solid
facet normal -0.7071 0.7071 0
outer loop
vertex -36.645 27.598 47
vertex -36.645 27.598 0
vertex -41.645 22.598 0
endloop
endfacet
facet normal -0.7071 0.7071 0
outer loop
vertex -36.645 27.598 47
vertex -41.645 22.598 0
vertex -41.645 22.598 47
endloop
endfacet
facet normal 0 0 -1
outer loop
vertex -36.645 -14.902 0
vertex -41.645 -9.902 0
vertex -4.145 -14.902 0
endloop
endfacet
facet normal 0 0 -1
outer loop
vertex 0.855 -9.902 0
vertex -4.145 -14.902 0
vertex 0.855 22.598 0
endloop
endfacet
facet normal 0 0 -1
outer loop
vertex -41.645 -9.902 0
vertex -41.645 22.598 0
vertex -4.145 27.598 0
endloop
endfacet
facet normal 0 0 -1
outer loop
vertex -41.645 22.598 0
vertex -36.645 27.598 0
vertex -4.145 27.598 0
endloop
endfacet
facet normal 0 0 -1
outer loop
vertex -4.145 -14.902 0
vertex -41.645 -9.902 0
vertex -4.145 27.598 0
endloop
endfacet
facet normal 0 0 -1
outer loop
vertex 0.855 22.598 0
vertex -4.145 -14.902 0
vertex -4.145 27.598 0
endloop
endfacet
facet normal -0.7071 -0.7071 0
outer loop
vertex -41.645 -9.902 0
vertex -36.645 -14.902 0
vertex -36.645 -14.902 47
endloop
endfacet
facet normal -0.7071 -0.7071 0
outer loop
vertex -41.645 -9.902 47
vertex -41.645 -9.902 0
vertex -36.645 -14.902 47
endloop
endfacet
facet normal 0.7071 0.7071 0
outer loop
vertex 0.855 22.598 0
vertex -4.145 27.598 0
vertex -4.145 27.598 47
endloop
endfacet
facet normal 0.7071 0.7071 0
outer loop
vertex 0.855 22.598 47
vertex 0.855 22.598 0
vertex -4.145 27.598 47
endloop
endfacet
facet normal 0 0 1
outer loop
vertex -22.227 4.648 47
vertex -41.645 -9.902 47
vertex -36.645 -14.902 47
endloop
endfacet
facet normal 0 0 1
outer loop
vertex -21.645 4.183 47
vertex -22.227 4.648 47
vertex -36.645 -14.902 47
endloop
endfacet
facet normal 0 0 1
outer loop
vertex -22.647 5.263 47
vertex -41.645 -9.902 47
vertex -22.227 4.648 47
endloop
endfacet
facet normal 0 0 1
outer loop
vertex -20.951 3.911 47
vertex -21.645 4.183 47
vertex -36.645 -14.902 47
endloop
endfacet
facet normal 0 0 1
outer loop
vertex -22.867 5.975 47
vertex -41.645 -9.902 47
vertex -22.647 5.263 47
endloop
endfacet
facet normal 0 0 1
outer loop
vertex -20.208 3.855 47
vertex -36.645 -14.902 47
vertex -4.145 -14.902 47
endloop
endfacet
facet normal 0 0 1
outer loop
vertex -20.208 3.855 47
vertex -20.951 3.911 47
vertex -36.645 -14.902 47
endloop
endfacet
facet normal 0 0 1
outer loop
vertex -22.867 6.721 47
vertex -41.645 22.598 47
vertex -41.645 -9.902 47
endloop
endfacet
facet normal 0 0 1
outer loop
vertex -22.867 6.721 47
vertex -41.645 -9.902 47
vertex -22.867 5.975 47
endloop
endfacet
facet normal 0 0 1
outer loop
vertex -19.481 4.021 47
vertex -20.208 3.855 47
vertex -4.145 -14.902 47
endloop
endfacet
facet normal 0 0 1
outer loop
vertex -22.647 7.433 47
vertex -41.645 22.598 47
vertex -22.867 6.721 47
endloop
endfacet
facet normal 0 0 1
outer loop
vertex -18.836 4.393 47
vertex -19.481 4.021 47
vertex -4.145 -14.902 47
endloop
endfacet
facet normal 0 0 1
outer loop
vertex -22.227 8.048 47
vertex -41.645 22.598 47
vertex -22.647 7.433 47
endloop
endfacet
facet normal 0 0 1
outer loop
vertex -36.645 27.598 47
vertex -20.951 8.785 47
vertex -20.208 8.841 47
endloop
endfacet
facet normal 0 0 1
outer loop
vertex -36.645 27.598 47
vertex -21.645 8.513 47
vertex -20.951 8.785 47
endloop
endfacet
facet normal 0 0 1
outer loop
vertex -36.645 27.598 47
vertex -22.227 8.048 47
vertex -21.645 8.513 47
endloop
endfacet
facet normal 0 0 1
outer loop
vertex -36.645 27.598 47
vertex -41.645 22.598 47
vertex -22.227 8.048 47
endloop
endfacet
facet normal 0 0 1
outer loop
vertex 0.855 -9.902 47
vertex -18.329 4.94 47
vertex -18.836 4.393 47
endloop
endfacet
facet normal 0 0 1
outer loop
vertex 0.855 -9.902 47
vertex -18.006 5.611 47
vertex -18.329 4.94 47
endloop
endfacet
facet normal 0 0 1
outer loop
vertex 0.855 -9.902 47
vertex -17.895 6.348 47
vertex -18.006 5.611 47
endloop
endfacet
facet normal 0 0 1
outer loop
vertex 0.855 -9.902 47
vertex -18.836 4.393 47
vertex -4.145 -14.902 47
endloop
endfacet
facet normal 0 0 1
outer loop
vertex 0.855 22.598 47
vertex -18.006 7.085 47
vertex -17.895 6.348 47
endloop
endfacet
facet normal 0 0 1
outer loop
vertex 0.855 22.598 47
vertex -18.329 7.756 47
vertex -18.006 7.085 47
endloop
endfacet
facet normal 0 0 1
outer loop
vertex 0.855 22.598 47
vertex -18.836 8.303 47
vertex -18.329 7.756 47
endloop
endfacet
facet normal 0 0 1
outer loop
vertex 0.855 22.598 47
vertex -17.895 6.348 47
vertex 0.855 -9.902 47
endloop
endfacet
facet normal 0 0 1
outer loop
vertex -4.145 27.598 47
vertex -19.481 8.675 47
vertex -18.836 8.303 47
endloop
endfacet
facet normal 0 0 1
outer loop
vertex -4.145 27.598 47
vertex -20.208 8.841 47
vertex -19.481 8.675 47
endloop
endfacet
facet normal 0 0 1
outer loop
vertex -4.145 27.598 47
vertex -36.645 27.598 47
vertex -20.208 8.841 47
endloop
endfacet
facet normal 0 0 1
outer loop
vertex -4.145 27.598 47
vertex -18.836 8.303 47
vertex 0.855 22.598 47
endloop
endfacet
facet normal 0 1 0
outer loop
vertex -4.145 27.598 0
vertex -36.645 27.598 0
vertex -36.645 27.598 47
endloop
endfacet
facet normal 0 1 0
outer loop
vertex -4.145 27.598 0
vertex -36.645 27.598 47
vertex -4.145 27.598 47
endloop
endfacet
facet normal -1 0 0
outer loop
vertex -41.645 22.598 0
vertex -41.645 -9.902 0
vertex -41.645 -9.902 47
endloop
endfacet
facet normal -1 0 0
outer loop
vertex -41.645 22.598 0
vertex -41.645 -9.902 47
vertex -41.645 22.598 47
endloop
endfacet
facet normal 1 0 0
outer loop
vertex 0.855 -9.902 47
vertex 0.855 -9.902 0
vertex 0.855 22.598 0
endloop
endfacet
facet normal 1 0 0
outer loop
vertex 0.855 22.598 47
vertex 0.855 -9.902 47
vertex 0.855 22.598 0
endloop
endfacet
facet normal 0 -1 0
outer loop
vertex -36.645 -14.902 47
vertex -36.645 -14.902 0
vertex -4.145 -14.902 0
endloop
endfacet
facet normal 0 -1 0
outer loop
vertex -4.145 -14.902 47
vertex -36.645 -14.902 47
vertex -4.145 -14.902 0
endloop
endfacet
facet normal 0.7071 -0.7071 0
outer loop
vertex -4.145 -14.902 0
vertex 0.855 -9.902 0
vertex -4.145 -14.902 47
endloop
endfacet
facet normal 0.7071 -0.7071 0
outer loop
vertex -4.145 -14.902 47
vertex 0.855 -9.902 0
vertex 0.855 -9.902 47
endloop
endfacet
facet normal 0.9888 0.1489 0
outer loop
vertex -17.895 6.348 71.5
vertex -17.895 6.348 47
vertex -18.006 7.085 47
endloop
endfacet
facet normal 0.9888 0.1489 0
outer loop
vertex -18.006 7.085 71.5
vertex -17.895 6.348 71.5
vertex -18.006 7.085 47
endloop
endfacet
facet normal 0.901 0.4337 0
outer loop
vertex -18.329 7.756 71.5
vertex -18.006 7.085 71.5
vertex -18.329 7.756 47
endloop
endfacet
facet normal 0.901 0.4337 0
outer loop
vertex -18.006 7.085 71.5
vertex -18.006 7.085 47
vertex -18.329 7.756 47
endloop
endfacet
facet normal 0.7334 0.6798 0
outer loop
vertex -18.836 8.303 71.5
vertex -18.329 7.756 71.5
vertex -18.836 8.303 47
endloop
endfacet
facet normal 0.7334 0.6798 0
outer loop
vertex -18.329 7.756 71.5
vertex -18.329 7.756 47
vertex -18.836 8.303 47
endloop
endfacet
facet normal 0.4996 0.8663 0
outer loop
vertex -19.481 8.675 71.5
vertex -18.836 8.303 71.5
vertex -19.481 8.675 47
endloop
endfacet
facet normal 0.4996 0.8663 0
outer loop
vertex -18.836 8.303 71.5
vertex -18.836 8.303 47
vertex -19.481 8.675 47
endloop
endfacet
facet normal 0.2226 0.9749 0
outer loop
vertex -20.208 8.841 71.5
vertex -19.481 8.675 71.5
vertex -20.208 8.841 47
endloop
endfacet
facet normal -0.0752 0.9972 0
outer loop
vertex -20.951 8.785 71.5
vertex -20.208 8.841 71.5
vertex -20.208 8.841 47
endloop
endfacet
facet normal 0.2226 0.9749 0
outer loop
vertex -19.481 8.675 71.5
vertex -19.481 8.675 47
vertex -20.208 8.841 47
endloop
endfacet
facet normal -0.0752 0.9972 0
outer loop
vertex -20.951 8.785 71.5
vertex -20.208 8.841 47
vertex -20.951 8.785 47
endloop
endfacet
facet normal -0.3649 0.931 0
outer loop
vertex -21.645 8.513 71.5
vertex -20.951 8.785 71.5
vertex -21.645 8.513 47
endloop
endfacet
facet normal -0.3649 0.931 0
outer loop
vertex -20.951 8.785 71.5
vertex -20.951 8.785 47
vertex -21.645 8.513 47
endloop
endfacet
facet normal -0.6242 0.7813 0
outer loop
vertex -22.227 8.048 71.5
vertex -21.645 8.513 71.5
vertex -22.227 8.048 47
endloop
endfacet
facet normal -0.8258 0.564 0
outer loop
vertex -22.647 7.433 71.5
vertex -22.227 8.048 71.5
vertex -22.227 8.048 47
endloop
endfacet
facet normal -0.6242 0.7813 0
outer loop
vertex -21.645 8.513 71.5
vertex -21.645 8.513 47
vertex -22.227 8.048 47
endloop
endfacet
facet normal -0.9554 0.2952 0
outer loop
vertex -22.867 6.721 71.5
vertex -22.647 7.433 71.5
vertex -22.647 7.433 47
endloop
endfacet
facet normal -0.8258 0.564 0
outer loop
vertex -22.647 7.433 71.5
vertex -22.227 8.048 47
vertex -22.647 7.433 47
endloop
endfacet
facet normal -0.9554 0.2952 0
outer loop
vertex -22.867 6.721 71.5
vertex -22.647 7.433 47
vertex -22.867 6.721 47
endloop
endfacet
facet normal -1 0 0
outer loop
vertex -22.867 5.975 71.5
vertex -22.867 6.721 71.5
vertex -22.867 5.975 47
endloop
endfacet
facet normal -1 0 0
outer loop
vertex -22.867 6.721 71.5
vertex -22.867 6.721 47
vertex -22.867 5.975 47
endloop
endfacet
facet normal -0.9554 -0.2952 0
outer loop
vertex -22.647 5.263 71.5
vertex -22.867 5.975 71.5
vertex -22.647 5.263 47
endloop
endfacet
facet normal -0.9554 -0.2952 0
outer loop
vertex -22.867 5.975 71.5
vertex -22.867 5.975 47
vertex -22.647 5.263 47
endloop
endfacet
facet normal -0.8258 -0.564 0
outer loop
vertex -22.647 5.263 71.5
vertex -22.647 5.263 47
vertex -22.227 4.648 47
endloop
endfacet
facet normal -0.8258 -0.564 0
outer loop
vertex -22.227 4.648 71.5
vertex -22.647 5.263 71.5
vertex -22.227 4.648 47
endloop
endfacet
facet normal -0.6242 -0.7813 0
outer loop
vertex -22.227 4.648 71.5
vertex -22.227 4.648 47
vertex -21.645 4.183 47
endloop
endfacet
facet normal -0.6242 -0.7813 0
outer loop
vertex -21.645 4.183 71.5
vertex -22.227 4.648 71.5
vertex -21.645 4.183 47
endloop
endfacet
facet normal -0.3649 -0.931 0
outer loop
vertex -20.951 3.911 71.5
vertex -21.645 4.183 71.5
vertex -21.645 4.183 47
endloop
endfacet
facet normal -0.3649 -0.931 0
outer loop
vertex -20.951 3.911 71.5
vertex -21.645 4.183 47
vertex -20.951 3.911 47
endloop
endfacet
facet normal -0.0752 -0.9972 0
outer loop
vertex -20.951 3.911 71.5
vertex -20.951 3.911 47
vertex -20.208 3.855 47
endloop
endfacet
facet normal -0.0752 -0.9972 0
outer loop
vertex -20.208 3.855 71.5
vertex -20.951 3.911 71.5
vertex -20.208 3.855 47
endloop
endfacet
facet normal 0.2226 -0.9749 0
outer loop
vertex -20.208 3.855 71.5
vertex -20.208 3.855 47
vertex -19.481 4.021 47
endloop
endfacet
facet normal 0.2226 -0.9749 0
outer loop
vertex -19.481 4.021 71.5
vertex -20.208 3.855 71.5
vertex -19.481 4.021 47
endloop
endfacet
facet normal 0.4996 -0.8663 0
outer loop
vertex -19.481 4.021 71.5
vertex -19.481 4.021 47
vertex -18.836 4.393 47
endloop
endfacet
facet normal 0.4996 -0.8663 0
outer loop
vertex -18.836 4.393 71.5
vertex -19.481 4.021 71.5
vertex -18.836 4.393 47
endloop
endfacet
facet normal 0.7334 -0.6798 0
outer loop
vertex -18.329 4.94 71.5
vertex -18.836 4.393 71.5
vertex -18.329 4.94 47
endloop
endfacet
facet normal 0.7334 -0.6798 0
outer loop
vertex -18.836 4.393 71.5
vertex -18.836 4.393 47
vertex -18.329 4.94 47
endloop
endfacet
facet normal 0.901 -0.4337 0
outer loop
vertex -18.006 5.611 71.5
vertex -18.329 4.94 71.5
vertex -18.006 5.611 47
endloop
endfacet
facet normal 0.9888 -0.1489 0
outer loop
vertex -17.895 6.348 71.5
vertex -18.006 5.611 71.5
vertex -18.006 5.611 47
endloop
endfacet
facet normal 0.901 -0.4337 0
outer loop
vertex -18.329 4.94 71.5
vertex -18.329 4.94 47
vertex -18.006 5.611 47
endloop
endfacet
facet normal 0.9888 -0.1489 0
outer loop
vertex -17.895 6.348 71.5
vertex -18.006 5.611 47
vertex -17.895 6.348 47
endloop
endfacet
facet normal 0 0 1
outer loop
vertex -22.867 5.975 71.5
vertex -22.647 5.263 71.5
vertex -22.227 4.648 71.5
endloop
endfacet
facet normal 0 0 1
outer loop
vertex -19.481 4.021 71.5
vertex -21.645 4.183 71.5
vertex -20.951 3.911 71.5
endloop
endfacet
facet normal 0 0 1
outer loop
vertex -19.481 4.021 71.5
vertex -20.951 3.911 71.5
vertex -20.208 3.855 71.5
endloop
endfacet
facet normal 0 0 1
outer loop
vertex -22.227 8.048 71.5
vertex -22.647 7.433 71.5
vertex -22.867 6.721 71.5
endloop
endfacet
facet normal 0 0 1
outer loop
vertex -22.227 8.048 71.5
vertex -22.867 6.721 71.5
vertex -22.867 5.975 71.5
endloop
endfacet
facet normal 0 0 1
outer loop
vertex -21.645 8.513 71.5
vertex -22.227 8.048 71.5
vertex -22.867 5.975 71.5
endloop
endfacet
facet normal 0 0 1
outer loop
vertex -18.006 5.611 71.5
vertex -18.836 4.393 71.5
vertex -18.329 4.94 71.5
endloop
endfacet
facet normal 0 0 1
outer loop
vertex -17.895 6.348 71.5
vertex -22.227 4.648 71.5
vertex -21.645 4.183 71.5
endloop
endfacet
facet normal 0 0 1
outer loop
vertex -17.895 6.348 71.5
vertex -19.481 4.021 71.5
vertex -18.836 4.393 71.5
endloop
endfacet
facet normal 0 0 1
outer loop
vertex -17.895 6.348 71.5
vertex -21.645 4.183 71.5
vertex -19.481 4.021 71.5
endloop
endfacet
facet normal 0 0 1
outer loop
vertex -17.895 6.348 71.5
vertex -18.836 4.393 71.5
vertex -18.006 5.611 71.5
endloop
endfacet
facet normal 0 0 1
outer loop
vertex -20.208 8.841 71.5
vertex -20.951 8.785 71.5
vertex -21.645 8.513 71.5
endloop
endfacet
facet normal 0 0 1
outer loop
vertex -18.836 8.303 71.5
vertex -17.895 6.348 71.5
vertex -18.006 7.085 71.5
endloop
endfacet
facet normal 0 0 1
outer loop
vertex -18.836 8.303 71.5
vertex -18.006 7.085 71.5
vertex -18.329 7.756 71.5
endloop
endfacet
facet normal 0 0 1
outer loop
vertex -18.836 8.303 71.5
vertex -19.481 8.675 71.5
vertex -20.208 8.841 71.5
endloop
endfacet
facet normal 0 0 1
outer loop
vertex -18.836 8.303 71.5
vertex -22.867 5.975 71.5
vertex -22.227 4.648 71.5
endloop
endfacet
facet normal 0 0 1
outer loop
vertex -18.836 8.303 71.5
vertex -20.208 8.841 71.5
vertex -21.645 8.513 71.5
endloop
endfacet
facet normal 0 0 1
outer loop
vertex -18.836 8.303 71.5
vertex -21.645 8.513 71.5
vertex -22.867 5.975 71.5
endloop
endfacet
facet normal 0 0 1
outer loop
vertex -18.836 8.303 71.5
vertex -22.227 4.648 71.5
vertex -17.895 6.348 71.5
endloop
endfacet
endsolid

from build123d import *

# Parameters (mm, degrees)
SKETCH1_W           = 42.5
SKETCH1_H           = 42.5
BOSS_EXTRUDE1_DEPTH = 47
CHAMFER1_SIZE       = 5
SKETCH2_R           = 2.5
BOSS_EXTRUDE2_DEPTH = 24.5


with BuildPart() as part:
    # Sketch1 → Boss-Extrude1 (new body)
    with BuildSketch(Plane.XY):
        with Locations((-20.394847779, 6.347974521)):
            Rectangle(SKETCH1_W, SKETCH1_H)
    extrude(amount=BOSS_EXTRUDE1_DEPTH)

    # Chamfer1
    chamfer1_edges = [part.edges().sort_by_distance(p)[0] for p in [
        (-41.644847779, 27.597974521, 23.5),
        (0.855152221, 27.597974521, 23.5),
        (0.855152221, -14.902025479, 23.5),
        (-41.644847779, -14.902025479, 23.5),
    ]]
    chamfer(chamfer1_edges, length=CHAMFER1_SIZE)

    # Sketch2 → Boss-Extrude2 (add)
    with BuildSketch(Plane.XY.offset(47)):
        with Locations((-20.394847779, 6.347974521)):
            Circle(SKETCH2_R)
    extrude(amount=BOSS_EXTRUDE2_DEPTH)


solid = part.part
